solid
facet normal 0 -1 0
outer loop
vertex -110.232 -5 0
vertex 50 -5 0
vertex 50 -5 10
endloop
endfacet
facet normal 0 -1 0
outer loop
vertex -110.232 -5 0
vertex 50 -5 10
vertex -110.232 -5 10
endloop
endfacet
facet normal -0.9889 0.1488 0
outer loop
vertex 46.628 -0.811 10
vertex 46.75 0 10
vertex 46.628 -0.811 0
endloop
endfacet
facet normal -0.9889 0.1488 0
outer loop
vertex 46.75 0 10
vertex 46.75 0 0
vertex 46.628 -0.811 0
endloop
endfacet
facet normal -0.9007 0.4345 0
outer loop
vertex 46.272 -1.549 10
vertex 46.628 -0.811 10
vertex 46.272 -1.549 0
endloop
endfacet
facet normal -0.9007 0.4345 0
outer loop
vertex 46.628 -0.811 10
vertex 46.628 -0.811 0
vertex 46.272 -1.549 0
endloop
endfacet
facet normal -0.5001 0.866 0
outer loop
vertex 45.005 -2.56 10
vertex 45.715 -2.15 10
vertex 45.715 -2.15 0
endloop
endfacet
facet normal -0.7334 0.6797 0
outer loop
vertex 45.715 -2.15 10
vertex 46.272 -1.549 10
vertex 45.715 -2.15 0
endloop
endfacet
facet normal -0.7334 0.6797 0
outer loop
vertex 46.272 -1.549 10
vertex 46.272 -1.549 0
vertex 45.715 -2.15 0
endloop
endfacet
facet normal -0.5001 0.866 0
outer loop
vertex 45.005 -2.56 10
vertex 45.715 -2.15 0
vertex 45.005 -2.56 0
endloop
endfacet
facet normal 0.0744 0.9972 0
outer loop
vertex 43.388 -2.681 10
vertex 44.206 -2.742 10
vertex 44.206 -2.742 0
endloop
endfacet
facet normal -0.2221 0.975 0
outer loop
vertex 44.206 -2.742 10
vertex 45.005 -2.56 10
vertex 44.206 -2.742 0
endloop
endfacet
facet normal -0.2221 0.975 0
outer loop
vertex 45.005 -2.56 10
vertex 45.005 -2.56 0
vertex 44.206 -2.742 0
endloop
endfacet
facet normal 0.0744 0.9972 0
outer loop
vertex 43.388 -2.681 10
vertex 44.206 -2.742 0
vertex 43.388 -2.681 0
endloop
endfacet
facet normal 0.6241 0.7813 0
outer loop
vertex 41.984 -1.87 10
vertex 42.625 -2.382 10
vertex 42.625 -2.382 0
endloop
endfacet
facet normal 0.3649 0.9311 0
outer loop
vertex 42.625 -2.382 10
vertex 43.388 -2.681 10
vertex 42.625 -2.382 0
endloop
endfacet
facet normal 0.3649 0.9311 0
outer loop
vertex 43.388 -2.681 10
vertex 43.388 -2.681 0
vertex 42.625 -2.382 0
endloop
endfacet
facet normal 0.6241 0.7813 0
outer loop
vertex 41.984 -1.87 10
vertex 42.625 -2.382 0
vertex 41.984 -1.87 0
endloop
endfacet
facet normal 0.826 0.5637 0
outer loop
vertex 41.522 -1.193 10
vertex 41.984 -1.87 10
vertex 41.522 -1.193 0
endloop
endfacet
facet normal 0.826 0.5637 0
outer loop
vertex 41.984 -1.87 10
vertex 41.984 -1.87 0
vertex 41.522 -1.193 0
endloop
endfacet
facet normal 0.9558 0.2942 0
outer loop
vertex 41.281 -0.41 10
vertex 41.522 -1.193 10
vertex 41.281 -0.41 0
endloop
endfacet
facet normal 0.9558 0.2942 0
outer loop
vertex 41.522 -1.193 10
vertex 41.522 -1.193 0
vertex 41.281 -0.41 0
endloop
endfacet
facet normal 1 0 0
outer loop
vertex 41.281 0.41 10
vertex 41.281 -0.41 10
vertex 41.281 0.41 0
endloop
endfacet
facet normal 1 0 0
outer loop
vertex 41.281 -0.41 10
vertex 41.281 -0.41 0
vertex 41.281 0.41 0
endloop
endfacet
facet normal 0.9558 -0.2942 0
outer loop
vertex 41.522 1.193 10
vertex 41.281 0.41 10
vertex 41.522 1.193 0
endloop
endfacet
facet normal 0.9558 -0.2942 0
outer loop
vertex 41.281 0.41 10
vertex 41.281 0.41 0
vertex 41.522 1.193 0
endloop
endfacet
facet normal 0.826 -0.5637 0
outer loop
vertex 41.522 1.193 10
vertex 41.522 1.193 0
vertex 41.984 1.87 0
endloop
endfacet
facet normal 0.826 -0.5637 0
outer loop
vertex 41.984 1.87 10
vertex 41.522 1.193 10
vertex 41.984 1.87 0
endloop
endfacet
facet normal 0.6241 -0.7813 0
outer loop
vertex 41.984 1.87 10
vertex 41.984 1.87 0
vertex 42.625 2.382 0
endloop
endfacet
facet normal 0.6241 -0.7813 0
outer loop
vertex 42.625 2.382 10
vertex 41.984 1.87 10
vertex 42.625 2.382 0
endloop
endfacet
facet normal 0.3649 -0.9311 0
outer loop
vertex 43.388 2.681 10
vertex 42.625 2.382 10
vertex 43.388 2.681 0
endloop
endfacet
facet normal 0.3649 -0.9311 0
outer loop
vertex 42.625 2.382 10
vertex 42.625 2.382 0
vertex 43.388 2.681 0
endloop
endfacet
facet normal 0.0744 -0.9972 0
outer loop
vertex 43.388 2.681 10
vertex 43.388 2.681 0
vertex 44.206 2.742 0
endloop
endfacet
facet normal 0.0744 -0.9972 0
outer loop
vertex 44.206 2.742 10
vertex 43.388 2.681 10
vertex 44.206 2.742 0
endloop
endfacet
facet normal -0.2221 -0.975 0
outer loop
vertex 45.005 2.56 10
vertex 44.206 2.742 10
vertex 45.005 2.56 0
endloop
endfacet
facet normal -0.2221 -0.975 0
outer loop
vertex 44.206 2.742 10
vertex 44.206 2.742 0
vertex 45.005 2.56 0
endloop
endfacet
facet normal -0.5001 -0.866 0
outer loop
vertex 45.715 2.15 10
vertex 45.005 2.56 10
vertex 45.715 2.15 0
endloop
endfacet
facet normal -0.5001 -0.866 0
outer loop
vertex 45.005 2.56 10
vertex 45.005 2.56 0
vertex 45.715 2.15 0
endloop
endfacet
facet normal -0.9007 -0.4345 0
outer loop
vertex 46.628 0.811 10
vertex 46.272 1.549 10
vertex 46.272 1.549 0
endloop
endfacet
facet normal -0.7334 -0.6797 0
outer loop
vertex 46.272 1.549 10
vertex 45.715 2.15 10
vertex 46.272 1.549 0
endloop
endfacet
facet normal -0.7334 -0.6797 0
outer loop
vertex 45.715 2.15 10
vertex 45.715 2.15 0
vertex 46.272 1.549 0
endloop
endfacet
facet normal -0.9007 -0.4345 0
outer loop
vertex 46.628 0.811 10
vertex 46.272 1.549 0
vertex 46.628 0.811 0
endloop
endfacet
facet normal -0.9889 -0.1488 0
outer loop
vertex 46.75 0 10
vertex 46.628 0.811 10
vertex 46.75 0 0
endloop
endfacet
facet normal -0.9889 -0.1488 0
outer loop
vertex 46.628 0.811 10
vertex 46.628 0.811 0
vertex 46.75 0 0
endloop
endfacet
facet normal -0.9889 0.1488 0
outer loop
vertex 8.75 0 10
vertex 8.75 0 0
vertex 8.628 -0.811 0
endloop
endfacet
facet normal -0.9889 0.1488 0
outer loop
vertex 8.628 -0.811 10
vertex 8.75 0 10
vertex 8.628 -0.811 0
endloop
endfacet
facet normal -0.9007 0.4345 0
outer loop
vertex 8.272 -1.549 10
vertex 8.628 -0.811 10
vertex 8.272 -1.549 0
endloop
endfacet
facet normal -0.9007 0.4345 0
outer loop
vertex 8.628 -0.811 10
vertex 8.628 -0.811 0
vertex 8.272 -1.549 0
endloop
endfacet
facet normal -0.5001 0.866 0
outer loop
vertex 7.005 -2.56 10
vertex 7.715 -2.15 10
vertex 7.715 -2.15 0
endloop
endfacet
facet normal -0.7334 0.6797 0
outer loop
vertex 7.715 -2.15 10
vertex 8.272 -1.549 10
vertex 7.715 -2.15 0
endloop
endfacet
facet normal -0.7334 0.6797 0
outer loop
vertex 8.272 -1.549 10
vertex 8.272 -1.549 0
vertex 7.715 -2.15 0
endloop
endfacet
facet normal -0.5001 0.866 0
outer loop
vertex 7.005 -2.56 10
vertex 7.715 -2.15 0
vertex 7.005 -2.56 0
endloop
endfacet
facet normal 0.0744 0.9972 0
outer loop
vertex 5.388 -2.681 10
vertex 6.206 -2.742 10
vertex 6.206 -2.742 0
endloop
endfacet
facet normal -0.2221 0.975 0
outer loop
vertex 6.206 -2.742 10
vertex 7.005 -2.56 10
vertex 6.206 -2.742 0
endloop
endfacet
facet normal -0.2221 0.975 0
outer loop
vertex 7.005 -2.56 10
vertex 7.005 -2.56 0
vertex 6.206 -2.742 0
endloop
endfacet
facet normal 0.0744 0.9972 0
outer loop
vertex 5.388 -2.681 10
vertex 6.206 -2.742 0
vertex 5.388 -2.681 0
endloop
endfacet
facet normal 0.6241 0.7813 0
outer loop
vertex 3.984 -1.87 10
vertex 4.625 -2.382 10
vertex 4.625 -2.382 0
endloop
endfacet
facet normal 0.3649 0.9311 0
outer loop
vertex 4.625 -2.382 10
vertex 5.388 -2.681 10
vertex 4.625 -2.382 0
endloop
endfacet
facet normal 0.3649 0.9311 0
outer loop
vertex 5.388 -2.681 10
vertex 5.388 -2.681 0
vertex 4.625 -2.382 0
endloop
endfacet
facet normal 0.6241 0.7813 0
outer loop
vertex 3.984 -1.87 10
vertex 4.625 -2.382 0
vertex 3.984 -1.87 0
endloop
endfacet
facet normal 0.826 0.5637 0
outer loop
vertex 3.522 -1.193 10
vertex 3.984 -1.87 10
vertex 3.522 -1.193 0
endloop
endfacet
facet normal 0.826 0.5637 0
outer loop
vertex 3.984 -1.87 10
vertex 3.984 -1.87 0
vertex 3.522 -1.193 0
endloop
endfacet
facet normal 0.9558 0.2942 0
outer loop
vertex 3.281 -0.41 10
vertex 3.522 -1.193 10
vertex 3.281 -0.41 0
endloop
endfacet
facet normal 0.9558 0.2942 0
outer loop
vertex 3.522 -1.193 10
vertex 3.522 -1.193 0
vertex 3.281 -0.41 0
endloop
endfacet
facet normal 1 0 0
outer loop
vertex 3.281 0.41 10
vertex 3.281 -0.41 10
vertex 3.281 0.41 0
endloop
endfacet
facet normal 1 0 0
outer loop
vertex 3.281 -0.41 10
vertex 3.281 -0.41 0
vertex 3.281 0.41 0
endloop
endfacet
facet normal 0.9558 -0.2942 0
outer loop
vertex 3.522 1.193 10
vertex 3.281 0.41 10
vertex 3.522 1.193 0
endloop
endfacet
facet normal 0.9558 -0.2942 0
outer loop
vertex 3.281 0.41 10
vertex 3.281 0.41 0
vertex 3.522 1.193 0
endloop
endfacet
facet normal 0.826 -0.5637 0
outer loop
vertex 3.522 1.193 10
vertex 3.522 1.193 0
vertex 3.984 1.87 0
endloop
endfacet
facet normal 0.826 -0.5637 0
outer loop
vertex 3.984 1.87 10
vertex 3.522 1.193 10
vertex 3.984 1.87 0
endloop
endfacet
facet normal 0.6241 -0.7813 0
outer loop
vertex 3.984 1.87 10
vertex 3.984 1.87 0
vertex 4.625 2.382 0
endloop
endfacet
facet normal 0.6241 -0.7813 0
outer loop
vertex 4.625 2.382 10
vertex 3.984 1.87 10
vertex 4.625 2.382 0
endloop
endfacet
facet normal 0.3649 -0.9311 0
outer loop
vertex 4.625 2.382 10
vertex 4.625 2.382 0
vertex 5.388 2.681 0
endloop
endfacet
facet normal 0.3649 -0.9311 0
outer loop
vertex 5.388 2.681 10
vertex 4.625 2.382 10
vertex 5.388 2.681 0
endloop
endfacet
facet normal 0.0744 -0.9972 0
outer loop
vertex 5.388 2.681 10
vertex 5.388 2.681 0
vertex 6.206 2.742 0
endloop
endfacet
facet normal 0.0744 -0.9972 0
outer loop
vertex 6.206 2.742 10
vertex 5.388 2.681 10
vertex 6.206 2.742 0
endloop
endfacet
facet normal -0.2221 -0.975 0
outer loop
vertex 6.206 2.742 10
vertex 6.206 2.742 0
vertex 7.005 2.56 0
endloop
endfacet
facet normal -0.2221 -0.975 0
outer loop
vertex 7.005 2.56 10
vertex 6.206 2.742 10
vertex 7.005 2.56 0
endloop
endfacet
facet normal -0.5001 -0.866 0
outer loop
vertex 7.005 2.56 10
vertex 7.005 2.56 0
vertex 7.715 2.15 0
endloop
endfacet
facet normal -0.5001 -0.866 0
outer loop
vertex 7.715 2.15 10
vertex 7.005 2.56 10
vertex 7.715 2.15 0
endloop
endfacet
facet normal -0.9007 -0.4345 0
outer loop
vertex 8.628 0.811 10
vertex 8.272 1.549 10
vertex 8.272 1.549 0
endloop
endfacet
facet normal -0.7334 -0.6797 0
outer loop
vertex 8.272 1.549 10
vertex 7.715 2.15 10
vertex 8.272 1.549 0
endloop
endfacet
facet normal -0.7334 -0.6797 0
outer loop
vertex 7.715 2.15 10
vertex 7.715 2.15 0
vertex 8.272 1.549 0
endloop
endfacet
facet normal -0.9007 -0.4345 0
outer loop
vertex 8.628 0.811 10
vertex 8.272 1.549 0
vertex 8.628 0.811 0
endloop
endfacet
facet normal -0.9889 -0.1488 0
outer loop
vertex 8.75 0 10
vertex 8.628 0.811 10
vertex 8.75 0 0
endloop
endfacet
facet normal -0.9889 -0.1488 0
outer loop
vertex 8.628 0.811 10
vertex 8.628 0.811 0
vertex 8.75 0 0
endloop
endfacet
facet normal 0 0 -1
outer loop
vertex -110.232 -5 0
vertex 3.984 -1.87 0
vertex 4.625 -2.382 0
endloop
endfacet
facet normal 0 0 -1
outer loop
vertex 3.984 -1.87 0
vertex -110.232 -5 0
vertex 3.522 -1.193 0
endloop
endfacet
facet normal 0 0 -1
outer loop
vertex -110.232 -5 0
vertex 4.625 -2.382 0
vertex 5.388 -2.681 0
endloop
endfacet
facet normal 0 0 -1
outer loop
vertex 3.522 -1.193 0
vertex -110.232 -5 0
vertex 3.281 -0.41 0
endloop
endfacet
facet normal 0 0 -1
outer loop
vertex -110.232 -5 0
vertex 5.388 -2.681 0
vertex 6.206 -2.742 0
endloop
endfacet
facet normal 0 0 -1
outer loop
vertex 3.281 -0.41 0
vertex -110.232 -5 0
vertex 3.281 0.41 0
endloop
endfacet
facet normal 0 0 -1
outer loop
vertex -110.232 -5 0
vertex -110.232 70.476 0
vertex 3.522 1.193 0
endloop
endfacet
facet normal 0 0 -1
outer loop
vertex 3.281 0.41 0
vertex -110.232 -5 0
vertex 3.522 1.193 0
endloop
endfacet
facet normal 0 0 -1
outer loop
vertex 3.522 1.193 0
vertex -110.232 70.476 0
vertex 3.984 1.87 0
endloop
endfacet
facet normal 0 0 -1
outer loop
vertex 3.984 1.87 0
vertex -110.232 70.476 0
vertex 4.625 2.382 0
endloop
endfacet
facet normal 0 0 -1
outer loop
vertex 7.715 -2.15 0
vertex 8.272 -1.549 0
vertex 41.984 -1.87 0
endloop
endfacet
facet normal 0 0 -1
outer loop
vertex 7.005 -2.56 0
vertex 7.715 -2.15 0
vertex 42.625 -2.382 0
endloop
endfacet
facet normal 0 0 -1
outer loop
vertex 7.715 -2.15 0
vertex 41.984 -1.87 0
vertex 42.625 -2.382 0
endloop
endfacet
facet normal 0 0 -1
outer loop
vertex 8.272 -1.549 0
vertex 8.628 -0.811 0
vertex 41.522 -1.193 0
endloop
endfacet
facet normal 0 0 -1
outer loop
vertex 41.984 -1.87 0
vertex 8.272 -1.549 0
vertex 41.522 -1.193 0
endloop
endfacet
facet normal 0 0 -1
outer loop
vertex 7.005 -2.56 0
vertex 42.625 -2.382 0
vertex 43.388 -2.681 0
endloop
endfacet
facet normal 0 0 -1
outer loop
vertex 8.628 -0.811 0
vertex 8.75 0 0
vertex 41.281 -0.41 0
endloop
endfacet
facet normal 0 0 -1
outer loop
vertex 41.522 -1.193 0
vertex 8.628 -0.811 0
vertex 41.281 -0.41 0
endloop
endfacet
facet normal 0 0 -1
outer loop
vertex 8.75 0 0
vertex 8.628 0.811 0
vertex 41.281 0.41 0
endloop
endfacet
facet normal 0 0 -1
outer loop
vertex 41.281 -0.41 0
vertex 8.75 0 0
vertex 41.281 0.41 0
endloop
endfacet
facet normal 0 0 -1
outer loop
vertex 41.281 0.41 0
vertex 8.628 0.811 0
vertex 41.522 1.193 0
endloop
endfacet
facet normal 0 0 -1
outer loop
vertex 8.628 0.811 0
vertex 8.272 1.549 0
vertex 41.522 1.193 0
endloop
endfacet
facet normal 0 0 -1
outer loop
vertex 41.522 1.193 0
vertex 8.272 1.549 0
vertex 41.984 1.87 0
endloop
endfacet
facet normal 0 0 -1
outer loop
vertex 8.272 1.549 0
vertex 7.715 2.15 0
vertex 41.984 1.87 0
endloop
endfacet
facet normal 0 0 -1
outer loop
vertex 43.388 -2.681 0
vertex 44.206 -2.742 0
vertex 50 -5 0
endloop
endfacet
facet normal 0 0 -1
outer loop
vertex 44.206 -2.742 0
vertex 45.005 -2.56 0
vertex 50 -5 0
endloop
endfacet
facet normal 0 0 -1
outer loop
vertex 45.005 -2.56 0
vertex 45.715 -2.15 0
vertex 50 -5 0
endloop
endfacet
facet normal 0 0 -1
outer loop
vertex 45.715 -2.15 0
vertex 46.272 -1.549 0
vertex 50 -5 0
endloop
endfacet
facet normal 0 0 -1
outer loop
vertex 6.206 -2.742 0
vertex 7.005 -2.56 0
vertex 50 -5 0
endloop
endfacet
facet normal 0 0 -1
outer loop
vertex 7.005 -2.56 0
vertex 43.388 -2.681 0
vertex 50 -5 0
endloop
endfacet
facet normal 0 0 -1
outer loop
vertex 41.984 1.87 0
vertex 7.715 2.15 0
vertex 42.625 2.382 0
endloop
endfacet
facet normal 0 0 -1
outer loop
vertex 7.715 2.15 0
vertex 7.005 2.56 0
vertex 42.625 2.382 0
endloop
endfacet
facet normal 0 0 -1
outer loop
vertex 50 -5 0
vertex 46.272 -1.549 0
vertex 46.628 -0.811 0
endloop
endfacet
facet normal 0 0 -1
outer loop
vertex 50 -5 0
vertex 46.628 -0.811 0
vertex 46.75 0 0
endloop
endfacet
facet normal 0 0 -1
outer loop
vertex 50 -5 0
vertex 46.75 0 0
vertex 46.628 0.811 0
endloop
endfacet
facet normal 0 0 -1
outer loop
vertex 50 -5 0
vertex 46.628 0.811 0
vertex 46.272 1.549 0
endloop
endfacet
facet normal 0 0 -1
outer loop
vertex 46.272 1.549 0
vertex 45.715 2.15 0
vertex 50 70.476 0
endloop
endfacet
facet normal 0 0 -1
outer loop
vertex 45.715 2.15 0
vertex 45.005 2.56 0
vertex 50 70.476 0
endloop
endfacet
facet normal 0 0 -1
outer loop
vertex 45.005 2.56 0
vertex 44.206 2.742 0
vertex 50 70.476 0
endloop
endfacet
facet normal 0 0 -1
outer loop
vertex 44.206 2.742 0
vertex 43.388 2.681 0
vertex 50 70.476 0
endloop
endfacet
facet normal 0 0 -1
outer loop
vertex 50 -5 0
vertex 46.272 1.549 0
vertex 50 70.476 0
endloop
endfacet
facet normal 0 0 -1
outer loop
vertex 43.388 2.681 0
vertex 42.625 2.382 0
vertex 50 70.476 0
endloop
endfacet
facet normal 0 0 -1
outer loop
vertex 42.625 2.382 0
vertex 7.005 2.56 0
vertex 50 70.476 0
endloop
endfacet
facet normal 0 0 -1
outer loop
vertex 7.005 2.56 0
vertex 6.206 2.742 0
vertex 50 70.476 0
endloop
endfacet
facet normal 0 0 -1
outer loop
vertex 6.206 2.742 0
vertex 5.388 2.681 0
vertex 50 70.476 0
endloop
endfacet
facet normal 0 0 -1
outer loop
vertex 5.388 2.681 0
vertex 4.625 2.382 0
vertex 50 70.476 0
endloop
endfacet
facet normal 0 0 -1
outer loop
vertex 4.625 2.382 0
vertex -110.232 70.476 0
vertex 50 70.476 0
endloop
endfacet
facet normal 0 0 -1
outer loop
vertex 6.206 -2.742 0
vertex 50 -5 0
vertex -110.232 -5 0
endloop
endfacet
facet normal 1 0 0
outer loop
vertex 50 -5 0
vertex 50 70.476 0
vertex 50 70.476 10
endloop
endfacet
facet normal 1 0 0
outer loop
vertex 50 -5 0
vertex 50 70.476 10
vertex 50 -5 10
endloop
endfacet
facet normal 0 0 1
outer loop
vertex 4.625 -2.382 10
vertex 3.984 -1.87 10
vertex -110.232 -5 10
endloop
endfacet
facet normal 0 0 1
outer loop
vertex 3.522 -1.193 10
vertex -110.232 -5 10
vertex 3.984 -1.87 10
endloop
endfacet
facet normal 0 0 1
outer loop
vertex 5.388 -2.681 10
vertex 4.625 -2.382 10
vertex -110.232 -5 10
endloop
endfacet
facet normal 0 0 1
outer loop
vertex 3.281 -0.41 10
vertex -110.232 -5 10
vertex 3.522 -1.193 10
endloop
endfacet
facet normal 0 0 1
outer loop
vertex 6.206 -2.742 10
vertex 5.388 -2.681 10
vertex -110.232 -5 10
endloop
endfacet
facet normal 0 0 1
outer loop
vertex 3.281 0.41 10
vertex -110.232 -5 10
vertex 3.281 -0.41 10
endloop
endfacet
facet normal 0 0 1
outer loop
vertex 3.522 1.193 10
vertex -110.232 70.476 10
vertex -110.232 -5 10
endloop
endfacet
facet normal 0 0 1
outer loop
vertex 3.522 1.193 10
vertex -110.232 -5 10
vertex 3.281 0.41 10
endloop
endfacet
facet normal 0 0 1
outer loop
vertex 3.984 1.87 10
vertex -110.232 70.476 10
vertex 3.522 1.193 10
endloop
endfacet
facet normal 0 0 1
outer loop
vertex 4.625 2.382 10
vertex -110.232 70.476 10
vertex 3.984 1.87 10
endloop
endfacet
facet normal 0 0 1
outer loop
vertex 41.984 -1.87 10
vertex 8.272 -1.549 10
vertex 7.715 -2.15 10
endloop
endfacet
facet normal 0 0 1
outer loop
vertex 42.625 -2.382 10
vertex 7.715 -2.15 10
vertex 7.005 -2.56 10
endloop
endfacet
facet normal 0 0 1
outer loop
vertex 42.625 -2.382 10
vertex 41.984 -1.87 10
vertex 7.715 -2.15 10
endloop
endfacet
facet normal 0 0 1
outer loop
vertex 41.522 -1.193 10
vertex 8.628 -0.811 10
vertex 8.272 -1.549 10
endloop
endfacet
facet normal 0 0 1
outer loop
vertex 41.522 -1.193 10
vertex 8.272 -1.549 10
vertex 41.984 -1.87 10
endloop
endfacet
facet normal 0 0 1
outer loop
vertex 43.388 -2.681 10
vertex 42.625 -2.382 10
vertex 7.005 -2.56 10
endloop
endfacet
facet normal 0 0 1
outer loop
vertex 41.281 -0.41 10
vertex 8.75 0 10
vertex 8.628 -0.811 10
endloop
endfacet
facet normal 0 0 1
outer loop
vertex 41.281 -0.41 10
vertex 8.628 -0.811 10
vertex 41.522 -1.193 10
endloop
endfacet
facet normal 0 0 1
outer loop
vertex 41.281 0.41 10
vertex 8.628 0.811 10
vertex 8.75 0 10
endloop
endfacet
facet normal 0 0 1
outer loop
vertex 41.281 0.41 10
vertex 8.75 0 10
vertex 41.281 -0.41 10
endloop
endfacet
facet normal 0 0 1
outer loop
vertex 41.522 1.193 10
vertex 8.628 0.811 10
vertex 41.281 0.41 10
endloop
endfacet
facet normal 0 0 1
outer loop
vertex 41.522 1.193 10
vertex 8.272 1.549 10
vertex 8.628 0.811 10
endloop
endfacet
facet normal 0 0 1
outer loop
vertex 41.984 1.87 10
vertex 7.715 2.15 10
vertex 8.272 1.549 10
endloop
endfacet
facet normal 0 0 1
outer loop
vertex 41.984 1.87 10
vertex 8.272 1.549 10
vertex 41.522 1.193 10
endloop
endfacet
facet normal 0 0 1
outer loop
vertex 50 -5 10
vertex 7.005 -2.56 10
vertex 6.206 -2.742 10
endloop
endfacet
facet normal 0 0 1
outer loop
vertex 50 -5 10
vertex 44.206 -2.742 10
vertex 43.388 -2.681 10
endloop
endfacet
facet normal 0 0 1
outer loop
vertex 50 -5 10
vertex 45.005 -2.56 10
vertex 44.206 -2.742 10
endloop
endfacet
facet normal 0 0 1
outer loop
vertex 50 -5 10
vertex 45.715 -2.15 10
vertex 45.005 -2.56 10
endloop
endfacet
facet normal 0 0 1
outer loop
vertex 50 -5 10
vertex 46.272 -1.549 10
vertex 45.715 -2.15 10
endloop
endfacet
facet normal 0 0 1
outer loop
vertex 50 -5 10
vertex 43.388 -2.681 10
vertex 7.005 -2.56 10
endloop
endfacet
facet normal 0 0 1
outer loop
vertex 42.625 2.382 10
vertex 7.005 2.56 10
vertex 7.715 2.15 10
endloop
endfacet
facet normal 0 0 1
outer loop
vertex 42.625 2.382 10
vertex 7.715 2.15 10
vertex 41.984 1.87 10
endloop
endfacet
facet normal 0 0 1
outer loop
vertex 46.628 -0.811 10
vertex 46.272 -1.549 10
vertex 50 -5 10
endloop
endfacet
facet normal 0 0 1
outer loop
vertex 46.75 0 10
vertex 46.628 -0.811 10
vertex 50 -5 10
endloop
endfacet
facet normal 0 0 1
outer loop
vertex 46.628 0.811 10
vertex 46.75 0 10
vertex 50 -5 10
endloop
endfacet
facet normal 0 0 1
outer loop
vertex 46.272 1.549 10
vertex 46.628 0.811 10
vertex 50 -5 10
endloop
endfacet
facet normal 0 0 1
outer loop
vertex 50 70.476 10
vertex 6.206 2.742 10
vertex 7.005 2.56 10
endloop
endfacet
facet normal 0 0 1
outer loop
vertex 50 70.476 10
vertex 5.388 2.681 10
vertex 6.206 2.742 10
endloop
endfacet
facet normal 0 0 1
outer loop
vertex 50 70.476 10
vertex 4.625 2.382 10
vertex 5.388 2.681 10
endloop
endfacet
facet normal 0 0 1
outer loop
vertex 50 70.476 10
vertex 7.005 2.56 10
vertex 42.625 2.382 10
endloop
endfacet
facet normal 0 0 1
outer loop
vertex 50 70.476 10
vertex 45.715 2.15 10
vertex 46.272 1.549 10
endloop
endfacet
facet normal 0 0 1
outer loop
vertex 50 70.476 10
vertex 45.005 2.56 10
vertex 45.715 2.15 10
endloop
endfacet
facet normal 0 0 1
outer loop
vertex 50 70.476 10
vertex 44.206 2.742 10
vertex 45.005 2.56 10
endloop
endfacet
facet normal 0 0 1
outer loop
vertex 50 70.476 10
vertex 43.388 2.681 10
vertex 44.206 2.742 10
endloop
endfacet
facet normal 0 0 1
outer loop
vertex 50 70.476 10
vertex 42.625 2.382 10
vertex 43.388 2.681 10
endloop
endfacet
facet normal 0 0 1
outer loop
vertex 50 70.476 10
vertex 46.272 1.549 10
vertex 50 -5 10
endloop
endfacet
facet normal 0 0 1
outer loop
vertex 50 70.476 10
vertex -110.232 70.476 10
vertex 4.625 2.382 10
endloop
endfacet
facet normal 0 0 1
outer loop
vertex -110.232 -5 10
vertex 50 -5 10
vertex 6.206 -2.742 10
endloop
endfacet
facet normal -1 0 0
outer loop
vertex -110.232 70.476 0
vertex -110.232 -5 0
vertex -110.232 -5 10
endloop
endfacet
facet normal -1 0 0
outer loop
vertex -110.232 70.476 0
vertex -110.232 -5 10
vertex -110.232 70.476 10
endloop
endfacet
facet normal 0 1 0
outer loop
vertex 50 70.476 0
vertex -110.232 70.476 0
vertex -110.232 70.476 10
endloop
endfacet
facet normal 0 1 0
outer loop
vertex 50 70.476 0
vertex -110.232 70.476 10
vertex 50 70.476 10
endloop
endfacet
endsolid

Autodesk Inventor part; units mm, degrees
ref_plane "YZ Plane" through (0, 0, 0) normal (1, 0, 0) x (0, 1, 0)
ref_plane "XZ Plane" through (0, 0, 0) normal (0, 1, 0) x (-1, 0, 0)
ref_plane "XY Plane" through (0, 0, 0) normal (0, 0, 1) x (1, 0, 0)
sketch "スケッチ1" plane through (0, 0, 0) normal (0, 0, 1) x (1, 0, 0)
  line L0 (50, -5) -> (-110.2322, -5)
  line L1 (-110.2322, -5) -> (-110.2322, 70.4763)
  line L2 (-110.2322, 70.4763) -> (50, 70.4763)
  line L3 (50, 70.4763) -> (50, -5)
  circle A0 centre (44, 0) radius 2.75 projected
  circle A1 centre (6, 0) radius 2.75 projected
  point P0 (0, 0)
extrude "押し出し1" add sketch "スケッチ1" along normal blind 10
